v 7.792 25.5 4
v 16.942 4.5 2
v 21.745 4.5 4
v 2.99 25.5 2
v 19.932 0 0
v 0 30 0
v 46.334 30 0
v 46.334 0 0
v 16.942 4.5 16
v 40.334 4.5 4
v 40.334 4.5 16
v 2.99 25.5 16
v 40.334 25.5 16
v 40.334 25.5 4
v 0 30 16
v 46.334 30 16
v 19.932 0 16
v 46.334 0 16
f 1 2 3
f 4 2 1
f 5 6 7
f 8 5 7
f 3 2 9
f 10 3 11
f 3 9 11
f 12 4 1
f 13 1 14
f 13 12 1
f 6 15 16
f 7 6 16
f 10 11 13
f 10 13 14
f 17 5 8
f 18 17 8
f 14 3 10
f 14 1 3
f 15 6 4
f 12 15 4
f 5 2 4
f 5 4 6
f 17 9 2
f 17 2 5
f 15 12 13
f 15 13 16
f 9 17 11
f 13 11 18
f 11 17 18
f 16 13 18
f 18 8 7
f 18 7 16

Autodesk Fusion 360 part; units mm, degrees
sketch "Base" plane through (0, 0, 0) normal (0, 0, 1) x (1, 0, 0) in component "Colour Sensor Holder Bottom"
  line L0 (0, 0) -> (46.334, 0)
  line L1 (46.334, 0) -> (46.334, 30)
  line L2 (46.334, 30) -> (0, 30)
  line L3 (0, 30) -> (0, 0)
  dimension "d2" = 46.334
  dimension "d3" = 30
extrude "Extrude1" add sketch "Base" along normal blind 4 in component "Colour Sensor Holder Bottom"
sketch "Side Profile" plane through (0, 0, 0) normal (0, -1, 0) x (1, 0, 0) in component "Colour Sensor Holder Bottom"
  line L0 (0, 0) -> (46.334, 0)
  line L1 (46.334, 0) -> (46.334, 4)
  line L2 (46.334, 4) -> (0, 4)
  line L3 (0, 4) -> (0, 0)
  line L4 (46.334, 4) -> (46.334, 16)
  line L5 (46.334, 16) -> (80.334, 16)
  line L6 (80.334, 16) -> (80.334, 30)
  line L7 (80.334, 30) -> (0, 30)
  line L8 (0, 30) -> (0, 4)
  dimension "d6" = 12
  dimension "d7" = 34
  dimension "d8" = 14
  dimension "d11" = 46.334
  dimension "d52" = 80.334
extrude "Extrude2" add sketch "Side Profile" against normal blind 4.5 contours L2 L4 L5 L6 L7 L8 in component "Colour Sensor Holder Bottom"
extrude "Extrude3" add sketch "Side Profile" against normal blind 4.5 from surface at -25.5 contours L2 L4 L5 L6 L7 L8 in component "Colour Sensor Holder Bottom"
sketch "Front End" plane through (0, 0, 0) normal (0, -1, 0) x (1, 0, 0) in component "Colour Sensor Holder Bottom"
  line L0 (0, 0) -> (46.334, 0)
  line L1 (46.334, 0) -> (46.334, 16)
  line L2 (46.334, 16) -> (80.334, 16)
  line L3 (80.334, 16) -> (80.334, 30)
  line L4 (80.334, 30) -> (0, 30)
  line L5 (0, 30) -> (0, 0)
  line L6 (80.334, 30) -> (76.034, 30)
  line L7 (76.034, 30) -> (76.034, 16)
  line L8 (76.034, 16) -> (80.334, 16)
  line L9 (80.334, 16) -> (80.334, 30)
  dimension "d17" = 4.3
extrude "Extrude4" add sketch "Front End" against normal blind 30 contours L2 L3 L4 L6 L7 L8 L9 in component "Colour Sensor Holder Bottom"
sketch "Middle End" plane through (0, 0, 0) normal (0, -1, 0) x (1, 0, 0) in component "Colour Sensor Holder Bottom"
  line L0 (80.334, 30) -> (0, 30)
  line L1 (0, 30) -> (0, 0)
  line L2 (0, 0) -> (46.334, 0)
  line L3 (46.334, 0) -> (46.334, 16)
  line L4 (46.334, 16) -> (80.334, 16)
  line L5 (80.334, 16) -> (80.334, 30)
  line L6 (46.334, 23) -> (40.334, 23)
  line L7 (40.334, 23) -> (40.334, 0)
  line L8 (40.334, 0) -> (46.334, 0)
  line L9 (46.334, 0) -> (46.334, 23)
  dimension "d20" = 7
  dimension "d21" = 6
extrude "Extrude5" add sketch "Middle End" against normal blind 30 contours L2 L3 L6 L7 L8 L9 in component "Colour Sensor Holder Bottom"
sketch "Lip" plane through (76.034, 0, 0) normal (-1, 0, 0) x (0, -1, 0) in component "Colour Sensor Holder Bottom"
  line L0 (-25.5, 30) -> (-25.5, 16)
  line L1 (-25.5, 16) -> (-4.5, 16)
  line L2 (-4.5, 16) -> (-4.5, 30)
  line L3 (-4.5, 30) -> (-25.5, 30)
  line L4 (-18, 25) -> (-12, 25)
  line L5 (-12, 25) -> (-12, 21)
  line L6 (-12, 21) -> (-18, 21)
  line L7 (-18, 21) -> (-18, 25)
  dimension "d24" = 5
  dimension "d25" = 6
  dimension "d26" = 4
  dimension "d27" = 7.5
extrude "Extrude6" add sketch "Lip" along normal blind 4 contours L4 L5 L6 L7 in component "Colour Sensor Holder Bottom"
sketch "Magnet Holders" plane through (0, 0, 30) normal (0, 0, 1) x (-1, 0, 0) in component "Colour Sensor Holder Bottom"
  line L0 (-80.334, -30) -> (0, -30)
  line L1 (0, -30) -> (0, -25.5)
  line L2 (0, -25.5) -> (-76.034, -25.5)
  line L3 (-76.034, -25.5) -> (-76.034, -4.5)
  line L4 (-76.034, -4.5) -> (0, -4.5)
  line L5 (0, -4.5) -> (0, 0)
  line L6 (0, 0) -> (-80.334, 0)
  line L7 (-80.334, 0) -> (-80.334, -30)
  circle A0 centre (-68.334, -30) radius 5
  circle A1 centre (-38.334, -30) radius 5
  circle A2 centre (-38.334, 0) radius 5
  circle A3 centre (-68.334, 0) radius 5
  circle A4 centre (-38.334, 0) radius 2.75
  circle A5 centre (-68.334, 0) radius 2.75
  circle A6 centre (-38.334, -30) radius 2.75
  circle A7 centre (-68.334, -30) radius 2.75
  dimension "d33" = 10
  dimension "d34" = 10
  dimension "d35" = 10
  dimension "d36" = 10
  dimension "d37" = 12
  dimension "d38" = 12
  dimension "d43" = 5.5
  dimension "d44" = 5.5
  dimension "d45" = 5.5
  dimension "d46" = 5.5
  dimension "d50" = 42
  dimension "d51" = 42
extrude "Extrude8" add sketch "Magnet Holders" against normal blind 4 contours L0 A7 | L0 A0 A7 | L0 A1 A6 | L0 A6 | L6 A3 A5 | L6 A5 | L6 A2 A4 | L6 A4 picked at (-68.2655, -30.9141) picked at (-37.4674, -30.6679) picked at (-68.2655, 0.9141) picked at (-39.0365, 1.0303) in component "Colour Sensor Holder Bottom"
extrude "Extrude9" cut sketch "Magnet Holders" against normal blind 1.5 contours L0 A7 | L0 A7 | L0 A6 | L0 A6 | L6 A5 | L6 A5 | L6 A4 | L6 A4 in component "Colour Sensor Holder Bottom"
sketch "Conduit Angle" plane through (0, 0, 30) normal (0, 0, 1) x (-1, 0, 0) in component "Colour Sensor Holder Bottom"
  circle A0 centre (-68.334, 0) radius 2.75
  circle A1 centre (-38.334, -30) radius 2.75
  circle A2 centre (-38.334, 0) radius 2.75
  circle A3 centre (-68.334, -30) radius 2.75
  line L0 (-33.334, -30) -> (0, -30)
  line L1 (0, -30) -> (0, -25.5)
  line L2 (0, -25.5) -> (-76.034, -25.5)
  line L3 (-76.034, -25.5) -> (-76.034, -4.5)
  line L4 (-76.034, -4.5) -> (0, -4.5)
  line L5 (0, -4.5) -> (0, 0)
  line L6 (0, 0) -> (-33.334, 0)
  arc A4 (-33.334, 0) -> (-43.334, 0) centre (-38.334, 0) ccw
  line L7 (-43.334, 0) -> (-63.334, 0)
  arc A5 (-63.334, 0) -> (-73.334, 0) centre (-68.334, 0) ccw
  line L8 (-73.334, 0) -> (-80.334, 0)
  line L9 (-80.334, 0) -> (-80.334, -30)
  line L10 (-80.334, -30) -> (-73.334, -30)
  arc A6 (-73.334, -30) -> (-63.334, -30) centre (-68.334, -30) ccw
  line L11 (-63.334, -30) -> (-43.334, -30)
  arc A7 (-43.334, -30) -> (-33.334, -30) centre (-38.334, -30) ccw
  line L12 (-40.334, -4.5) -> (-40.334, -25.5)
  line L13 (-40.334, -25.5) -> (0, -25.5)
  line L14 (0, -25.5) -> (0, -4.5)
  line L15 (0, -4.5) -> (-40.334, -4.5)
  line L16 (0, -30) -> (-19.932, 0)
  dimension "d53" = 33.6
extrude "Extrude10" cut sketch "Conduit Angle" against normal blind 30 contours L1 L2 L13 L16 | L2 L4 L13 L14 L15 L16 | L4 L5 L6 L15 L16 in component "Colour Sensor Holder Bottom"
sketch "Conduit Height" plane through (13.8279, 9.1873, 0) normal (-0.8329, -0.5534, 0) x (0.5534, -0.8329, 0) in component "Colour Sensor Holder Bottom"
  line L0 (-19.585, 4) -> (-19.585, 30)
  line L1 (-19.585, 30) -> (-24.9876, 30)
  line L2 (-24.9876, 30) -> (-24.9876, 0)
  line L3 (-24.9876, 0) -> (11.0302, 0)
  line L4 (11.0302, 0) -> (11.0302, 30)
  line L5 (11.0302, 30) -> (5.6275, 30)
  line L6 (5.6275, 30) -> (5.6275, 4)
  line L7 (5.6275, 4) -> (-19.585, 4)
  line L8 (-24.9876, 0) -> (11.0302, 0)
  line L9 (11.0302, 0) -> (11.0302, 16)
  line L10 (11.0302, 16) -> (-24.9876, 16)
  line L11 (-24.9876, 16) -> (-24.9876, 0)
  point P0 (5.6275, 16)
  point P1 (-19.585, 16)
  dimension "d56" = 16
sketch "Colour Sensor Cover Shape" plane through (0, 0, 30) normal (0, 0, 1) x (-1, 0, 0) in component "Colour Sensor Holder Bottom"
  line L0 (0, -30) -> (-2.9898, -25.5)
  line L1 (-2.9898, -25.5) -> (-76.034, -25.5)
  line L2 (-76.034, -25.5) -> (-76.034, -4.5)
  line L3 (-76.034, -4.5) -> (-16.9422, -4.5)
  line L4 (-16.9422, -4.5) -> (-19.932, 0)
  line L5 (-19.932, 0) -> (-33.334, 0)
  arc A0 (-33.334, 0) -> (-43.334, 0) centre (-38.334, 0) ccw
  line L6 (-43.334, 0) -> (-63.334, 0)
  arc A1 (-63.334, 0) -> (-73.334, 0) centre (-68.334, 0) ccw
  line L7 (-73.334, 0) -> (-80.334, 0)
  line L8 (-80.334, 0) -> (-80.334, -30)
  line L9 (-80.334, -30) -> (-73.334, -30)
  arc A2 (-73.334, -30) -> (-63.334, -30) centre (-68.334, -30) ccw
  line L10 (-63.334, -30) -> (-43.334, -30)
  arc A3 (-43.334, -30) -> (-33.334, -30) centre (-38.334, -30) ccw
  line L11 (-33.334, -30) -> (0, -30)
  circle A4 centre (-68.334, 0) radius 2.75
  circle A5 centre (-38.334, -30) radius 2.75
  circle A6 centre (-38.334, 0) radius 2.75
  circle A7 centre (-68.334, -30) radius 2.75
  line L12 (-33.334, -30) -> (-33.334, 0)
  point P0 (-33.334, -25.5)
  point P1 (-33.334, -4.5)
sketch "Right Loft Outside Shape" plane through (0, 0, 0) normal (0, -1, 0) x (1, 0, 0) in component "Colour Sensor Holder Bottom"
  line L0 (19.932, 30) -> (19.932, 0)
  line L1 (19.932, 0) -> (46.334, 0)
  line L2 (46.334, 0) -> (46.334, 16)
  line L3 (46.334, 16) -> (80.334, 16)
  line L4 (80.334, 16) -> (80.334, 30)
  line L5 (80.334, 30) -> (73.334, 30)
  line L6 (73.334, 30) -> (73.334, 26)
  line L7 (73.334, 26) -> (63.334, 26)
  line L8 (63.334, 26) -> (63.334, 30)
  line L9 (63.334, 30) -> (43.334, 30)
  line L10 (43.334, 30) -> (43.334, 26)
  line L11 (43.334, 26) -> (33.334, 26)
  line L12 (33.334, 26) -> (33.334, 30)
  line L13 (33.334, 30) -> (19.932, 30)
  line L14 (33.334, 30) -> (19.932, 16)
  point P0 (33.334, 30)
  point P1 (19.932, 16)
sketch "Right Loft Inside Shape" plane through (0, 4.5, 0) normal (0, 1, 0) x (-1, 0, 0) in component "Colour Sensor Holder Bottom"
  line L0 (-16.9422, 4) -> (-16.9422, 30)
  line L1 (-16.9422, 30) -> (-76.034, 30)
  line L2 (-76.034, 30) -> (-76.034, 16)
  line L3 (-76.034, 16) -> (-46.334, 16)
  line L4 (-46.334, 16) -> (-46.334, 23)
  line L5 (-46.334, 23) -> (-40.334, 23)
  line L6 (-40.334, 23) -> (-40.334, 4)
  line L7 (-40.334, 4) -> (-16.9422, 4)
  line L8 (-33.334, 30) -> (-16.9422, 16)
  point P0 (-33.334, 30)
  point P1 (-16.9422, 16)
sketch "Left Loft Inside Shape" plane through (0, 25.5, 0) normal (0, -1, 0) x (1, 0, 0) in component "Colour Sensor Holder Bottom"
  line L0 (2.9898, 30) -> (2.9898, 4)
  line L1 (2.9898, 4) -> (40.334, 4)
  line L2 (40.334, 4) -> (40.334, 23)
  line L3 (40.334, 23) -> (46.334, 23)
  line L4 (46.334, 23) -> (46.334, 16)
  line L5 (46.334, 16) -> (76.034, 16)
  line L6 (76.034, 16) -> (76.034, 30)
  line L7 (76.034, 30) -> (2.9898, 30)
  line L8 (33.334, 30) -> (2.9898, 16)
  point P0 (33.334, 30)
  point P1 (2.9898, 16)
sketch "Left Loft Outside Shape" plane through (0, 30, 0) normal (0, 1, 0) x (-1, 0, 0) in component "Colour Sensor Holder Bottom"
  line L0 (-33.334, 30) -> (-33.334, 26)
  line L1 (-33.334, 26) -> (-43.334, 26)
  line L2 (-43.334, 26) -> (-43.334, 30)
  line L3 (-43.334, 30) -> (-63.334, 30)
  line L4 (-63.334, 30) -> (-63.334, 26)
  line L5 (-63.334, 26) -> (-73.334, 26)
  line L6 (-73.334, 26) -> (-73.334, 30)
  line L7 (-73.334, 30) -> (-80.334, 30)
  line L8 (-80.334, 30) -> (-80.334, 16)
  line L9 (-80.334, 16) -> (-46.334, 16)
  line L10 (-46.334, 16) -> (-46.334, 0)
  line L11 (-46.334, 0) -> (0, 0)
  line L12 (0, 0) -> (0, 30)
  line L13 (0, 30) -> (-33.334, 30)
  line L14 (-33.334, 30) -> (0, 16)
  point P0 (-33.334, 30)
  point P1 (0, 16)
loft "Loft1" cut profiles "Right Loft Outside Shape", "Right Loft Inside Shape" section 1 contours L0 L13 L14 section 2 contours L0 L1 L8 in component "Colour Sensor Holder Bottom"
loft "Loft2" cut profiles "Left Loft Inside Shape", "Left Loft Outside Shape" section 1 contours L0 L7 L8 section 2 contours L12 L13 L14 in component "Colour Sensor Holder Bottom"
chamfer "Chamfer2" distance 4 distance2 2 1 edges at (9.966, 15, 4) measured on face at (20.0887, 18.5, 4) in component "Colour Sensor Holder Bottom"
sketch "Top and Middle Segments" plane through (0, 0, 0) normal (0, -1, 0) x (1, 0, 0)
  line L0 (33.334, 30) -> (19.932, 16)
  line L1 (19.932, 16) -> (19.932, 0)
  line L2 (19.932, 0) -> (46.334, 0)
  line L3 (46.334, 0) -> (46.334, 16)
  line L4 (46.334, 16) -> (80.334, 16)
  line L5 (80.334, 16) -> (80.334, 30)
  line L6 (80.334, 30) -> (73.334, 30)
  line L7 (73.334, 30) -> (73.334, 26)
  line L8 (73.334, 26) -> (63.334, 26)
  line L9 (63.334, 26) -> (63.334, 30)
  line L10 (63.334, 30) -> (43.334, 30)
  line L11 (43.334, 30) -> (43.334, 26)
  line L12 (43.334, 26) -> (33.334, 26)
  line L13 (33.334, 26) -> (33.334, 30)
  line L14 (16.9422, 16) -> (16.9422, 2)
  line L15 (16.9422, 2) -> (2.9898, 2)
  line L16 (2.9898, 2) -> (2.9898, 16)
  line L17 (2.9898, 16) -> (0, 16)
  line L18 (0, 16) -> (0, 0)
  line L19 (0, 0) -> (19.932, 0)
  line L20 (19.932, 0) -> (19.932, 16)
  line L21 (19.932, 16) -> (16.9422, 16)
  line L22 (0, 16) -> (80.334, 16)
  line L23 (80.334, 16) -> (80.334, 30)
  line L24 (80.334, 30) -> (0, 30)
  line L25 (0, 30) -> (0, 16)
extrude "Extrude11" cut sketch "Top and Middle Segments" along normal blind -35 and the other way blind -5 contours L0 L4 L5 L6 L7 L8 L9 L10 L11 L12 L13 L22 L23 L24 | L11 L12 L13 L24 | L0 L17 L21 L22 L24 L25 | L7 L8 L9 L24 in component "Colour Sensor Holder Bottom"
component "Colour Sensor Holder Bottom" placed x (1, 0, 0) y (0, 1, 0) z (0, 0, 1) at (0, 0, 0)
equation "base_plate_thickness = 4 mm"
equation "d4 = base_plate_thickness"
equation "d37 = 7 mm + 5 mm"
equation "d38 = 7 mm + 5 mm"
